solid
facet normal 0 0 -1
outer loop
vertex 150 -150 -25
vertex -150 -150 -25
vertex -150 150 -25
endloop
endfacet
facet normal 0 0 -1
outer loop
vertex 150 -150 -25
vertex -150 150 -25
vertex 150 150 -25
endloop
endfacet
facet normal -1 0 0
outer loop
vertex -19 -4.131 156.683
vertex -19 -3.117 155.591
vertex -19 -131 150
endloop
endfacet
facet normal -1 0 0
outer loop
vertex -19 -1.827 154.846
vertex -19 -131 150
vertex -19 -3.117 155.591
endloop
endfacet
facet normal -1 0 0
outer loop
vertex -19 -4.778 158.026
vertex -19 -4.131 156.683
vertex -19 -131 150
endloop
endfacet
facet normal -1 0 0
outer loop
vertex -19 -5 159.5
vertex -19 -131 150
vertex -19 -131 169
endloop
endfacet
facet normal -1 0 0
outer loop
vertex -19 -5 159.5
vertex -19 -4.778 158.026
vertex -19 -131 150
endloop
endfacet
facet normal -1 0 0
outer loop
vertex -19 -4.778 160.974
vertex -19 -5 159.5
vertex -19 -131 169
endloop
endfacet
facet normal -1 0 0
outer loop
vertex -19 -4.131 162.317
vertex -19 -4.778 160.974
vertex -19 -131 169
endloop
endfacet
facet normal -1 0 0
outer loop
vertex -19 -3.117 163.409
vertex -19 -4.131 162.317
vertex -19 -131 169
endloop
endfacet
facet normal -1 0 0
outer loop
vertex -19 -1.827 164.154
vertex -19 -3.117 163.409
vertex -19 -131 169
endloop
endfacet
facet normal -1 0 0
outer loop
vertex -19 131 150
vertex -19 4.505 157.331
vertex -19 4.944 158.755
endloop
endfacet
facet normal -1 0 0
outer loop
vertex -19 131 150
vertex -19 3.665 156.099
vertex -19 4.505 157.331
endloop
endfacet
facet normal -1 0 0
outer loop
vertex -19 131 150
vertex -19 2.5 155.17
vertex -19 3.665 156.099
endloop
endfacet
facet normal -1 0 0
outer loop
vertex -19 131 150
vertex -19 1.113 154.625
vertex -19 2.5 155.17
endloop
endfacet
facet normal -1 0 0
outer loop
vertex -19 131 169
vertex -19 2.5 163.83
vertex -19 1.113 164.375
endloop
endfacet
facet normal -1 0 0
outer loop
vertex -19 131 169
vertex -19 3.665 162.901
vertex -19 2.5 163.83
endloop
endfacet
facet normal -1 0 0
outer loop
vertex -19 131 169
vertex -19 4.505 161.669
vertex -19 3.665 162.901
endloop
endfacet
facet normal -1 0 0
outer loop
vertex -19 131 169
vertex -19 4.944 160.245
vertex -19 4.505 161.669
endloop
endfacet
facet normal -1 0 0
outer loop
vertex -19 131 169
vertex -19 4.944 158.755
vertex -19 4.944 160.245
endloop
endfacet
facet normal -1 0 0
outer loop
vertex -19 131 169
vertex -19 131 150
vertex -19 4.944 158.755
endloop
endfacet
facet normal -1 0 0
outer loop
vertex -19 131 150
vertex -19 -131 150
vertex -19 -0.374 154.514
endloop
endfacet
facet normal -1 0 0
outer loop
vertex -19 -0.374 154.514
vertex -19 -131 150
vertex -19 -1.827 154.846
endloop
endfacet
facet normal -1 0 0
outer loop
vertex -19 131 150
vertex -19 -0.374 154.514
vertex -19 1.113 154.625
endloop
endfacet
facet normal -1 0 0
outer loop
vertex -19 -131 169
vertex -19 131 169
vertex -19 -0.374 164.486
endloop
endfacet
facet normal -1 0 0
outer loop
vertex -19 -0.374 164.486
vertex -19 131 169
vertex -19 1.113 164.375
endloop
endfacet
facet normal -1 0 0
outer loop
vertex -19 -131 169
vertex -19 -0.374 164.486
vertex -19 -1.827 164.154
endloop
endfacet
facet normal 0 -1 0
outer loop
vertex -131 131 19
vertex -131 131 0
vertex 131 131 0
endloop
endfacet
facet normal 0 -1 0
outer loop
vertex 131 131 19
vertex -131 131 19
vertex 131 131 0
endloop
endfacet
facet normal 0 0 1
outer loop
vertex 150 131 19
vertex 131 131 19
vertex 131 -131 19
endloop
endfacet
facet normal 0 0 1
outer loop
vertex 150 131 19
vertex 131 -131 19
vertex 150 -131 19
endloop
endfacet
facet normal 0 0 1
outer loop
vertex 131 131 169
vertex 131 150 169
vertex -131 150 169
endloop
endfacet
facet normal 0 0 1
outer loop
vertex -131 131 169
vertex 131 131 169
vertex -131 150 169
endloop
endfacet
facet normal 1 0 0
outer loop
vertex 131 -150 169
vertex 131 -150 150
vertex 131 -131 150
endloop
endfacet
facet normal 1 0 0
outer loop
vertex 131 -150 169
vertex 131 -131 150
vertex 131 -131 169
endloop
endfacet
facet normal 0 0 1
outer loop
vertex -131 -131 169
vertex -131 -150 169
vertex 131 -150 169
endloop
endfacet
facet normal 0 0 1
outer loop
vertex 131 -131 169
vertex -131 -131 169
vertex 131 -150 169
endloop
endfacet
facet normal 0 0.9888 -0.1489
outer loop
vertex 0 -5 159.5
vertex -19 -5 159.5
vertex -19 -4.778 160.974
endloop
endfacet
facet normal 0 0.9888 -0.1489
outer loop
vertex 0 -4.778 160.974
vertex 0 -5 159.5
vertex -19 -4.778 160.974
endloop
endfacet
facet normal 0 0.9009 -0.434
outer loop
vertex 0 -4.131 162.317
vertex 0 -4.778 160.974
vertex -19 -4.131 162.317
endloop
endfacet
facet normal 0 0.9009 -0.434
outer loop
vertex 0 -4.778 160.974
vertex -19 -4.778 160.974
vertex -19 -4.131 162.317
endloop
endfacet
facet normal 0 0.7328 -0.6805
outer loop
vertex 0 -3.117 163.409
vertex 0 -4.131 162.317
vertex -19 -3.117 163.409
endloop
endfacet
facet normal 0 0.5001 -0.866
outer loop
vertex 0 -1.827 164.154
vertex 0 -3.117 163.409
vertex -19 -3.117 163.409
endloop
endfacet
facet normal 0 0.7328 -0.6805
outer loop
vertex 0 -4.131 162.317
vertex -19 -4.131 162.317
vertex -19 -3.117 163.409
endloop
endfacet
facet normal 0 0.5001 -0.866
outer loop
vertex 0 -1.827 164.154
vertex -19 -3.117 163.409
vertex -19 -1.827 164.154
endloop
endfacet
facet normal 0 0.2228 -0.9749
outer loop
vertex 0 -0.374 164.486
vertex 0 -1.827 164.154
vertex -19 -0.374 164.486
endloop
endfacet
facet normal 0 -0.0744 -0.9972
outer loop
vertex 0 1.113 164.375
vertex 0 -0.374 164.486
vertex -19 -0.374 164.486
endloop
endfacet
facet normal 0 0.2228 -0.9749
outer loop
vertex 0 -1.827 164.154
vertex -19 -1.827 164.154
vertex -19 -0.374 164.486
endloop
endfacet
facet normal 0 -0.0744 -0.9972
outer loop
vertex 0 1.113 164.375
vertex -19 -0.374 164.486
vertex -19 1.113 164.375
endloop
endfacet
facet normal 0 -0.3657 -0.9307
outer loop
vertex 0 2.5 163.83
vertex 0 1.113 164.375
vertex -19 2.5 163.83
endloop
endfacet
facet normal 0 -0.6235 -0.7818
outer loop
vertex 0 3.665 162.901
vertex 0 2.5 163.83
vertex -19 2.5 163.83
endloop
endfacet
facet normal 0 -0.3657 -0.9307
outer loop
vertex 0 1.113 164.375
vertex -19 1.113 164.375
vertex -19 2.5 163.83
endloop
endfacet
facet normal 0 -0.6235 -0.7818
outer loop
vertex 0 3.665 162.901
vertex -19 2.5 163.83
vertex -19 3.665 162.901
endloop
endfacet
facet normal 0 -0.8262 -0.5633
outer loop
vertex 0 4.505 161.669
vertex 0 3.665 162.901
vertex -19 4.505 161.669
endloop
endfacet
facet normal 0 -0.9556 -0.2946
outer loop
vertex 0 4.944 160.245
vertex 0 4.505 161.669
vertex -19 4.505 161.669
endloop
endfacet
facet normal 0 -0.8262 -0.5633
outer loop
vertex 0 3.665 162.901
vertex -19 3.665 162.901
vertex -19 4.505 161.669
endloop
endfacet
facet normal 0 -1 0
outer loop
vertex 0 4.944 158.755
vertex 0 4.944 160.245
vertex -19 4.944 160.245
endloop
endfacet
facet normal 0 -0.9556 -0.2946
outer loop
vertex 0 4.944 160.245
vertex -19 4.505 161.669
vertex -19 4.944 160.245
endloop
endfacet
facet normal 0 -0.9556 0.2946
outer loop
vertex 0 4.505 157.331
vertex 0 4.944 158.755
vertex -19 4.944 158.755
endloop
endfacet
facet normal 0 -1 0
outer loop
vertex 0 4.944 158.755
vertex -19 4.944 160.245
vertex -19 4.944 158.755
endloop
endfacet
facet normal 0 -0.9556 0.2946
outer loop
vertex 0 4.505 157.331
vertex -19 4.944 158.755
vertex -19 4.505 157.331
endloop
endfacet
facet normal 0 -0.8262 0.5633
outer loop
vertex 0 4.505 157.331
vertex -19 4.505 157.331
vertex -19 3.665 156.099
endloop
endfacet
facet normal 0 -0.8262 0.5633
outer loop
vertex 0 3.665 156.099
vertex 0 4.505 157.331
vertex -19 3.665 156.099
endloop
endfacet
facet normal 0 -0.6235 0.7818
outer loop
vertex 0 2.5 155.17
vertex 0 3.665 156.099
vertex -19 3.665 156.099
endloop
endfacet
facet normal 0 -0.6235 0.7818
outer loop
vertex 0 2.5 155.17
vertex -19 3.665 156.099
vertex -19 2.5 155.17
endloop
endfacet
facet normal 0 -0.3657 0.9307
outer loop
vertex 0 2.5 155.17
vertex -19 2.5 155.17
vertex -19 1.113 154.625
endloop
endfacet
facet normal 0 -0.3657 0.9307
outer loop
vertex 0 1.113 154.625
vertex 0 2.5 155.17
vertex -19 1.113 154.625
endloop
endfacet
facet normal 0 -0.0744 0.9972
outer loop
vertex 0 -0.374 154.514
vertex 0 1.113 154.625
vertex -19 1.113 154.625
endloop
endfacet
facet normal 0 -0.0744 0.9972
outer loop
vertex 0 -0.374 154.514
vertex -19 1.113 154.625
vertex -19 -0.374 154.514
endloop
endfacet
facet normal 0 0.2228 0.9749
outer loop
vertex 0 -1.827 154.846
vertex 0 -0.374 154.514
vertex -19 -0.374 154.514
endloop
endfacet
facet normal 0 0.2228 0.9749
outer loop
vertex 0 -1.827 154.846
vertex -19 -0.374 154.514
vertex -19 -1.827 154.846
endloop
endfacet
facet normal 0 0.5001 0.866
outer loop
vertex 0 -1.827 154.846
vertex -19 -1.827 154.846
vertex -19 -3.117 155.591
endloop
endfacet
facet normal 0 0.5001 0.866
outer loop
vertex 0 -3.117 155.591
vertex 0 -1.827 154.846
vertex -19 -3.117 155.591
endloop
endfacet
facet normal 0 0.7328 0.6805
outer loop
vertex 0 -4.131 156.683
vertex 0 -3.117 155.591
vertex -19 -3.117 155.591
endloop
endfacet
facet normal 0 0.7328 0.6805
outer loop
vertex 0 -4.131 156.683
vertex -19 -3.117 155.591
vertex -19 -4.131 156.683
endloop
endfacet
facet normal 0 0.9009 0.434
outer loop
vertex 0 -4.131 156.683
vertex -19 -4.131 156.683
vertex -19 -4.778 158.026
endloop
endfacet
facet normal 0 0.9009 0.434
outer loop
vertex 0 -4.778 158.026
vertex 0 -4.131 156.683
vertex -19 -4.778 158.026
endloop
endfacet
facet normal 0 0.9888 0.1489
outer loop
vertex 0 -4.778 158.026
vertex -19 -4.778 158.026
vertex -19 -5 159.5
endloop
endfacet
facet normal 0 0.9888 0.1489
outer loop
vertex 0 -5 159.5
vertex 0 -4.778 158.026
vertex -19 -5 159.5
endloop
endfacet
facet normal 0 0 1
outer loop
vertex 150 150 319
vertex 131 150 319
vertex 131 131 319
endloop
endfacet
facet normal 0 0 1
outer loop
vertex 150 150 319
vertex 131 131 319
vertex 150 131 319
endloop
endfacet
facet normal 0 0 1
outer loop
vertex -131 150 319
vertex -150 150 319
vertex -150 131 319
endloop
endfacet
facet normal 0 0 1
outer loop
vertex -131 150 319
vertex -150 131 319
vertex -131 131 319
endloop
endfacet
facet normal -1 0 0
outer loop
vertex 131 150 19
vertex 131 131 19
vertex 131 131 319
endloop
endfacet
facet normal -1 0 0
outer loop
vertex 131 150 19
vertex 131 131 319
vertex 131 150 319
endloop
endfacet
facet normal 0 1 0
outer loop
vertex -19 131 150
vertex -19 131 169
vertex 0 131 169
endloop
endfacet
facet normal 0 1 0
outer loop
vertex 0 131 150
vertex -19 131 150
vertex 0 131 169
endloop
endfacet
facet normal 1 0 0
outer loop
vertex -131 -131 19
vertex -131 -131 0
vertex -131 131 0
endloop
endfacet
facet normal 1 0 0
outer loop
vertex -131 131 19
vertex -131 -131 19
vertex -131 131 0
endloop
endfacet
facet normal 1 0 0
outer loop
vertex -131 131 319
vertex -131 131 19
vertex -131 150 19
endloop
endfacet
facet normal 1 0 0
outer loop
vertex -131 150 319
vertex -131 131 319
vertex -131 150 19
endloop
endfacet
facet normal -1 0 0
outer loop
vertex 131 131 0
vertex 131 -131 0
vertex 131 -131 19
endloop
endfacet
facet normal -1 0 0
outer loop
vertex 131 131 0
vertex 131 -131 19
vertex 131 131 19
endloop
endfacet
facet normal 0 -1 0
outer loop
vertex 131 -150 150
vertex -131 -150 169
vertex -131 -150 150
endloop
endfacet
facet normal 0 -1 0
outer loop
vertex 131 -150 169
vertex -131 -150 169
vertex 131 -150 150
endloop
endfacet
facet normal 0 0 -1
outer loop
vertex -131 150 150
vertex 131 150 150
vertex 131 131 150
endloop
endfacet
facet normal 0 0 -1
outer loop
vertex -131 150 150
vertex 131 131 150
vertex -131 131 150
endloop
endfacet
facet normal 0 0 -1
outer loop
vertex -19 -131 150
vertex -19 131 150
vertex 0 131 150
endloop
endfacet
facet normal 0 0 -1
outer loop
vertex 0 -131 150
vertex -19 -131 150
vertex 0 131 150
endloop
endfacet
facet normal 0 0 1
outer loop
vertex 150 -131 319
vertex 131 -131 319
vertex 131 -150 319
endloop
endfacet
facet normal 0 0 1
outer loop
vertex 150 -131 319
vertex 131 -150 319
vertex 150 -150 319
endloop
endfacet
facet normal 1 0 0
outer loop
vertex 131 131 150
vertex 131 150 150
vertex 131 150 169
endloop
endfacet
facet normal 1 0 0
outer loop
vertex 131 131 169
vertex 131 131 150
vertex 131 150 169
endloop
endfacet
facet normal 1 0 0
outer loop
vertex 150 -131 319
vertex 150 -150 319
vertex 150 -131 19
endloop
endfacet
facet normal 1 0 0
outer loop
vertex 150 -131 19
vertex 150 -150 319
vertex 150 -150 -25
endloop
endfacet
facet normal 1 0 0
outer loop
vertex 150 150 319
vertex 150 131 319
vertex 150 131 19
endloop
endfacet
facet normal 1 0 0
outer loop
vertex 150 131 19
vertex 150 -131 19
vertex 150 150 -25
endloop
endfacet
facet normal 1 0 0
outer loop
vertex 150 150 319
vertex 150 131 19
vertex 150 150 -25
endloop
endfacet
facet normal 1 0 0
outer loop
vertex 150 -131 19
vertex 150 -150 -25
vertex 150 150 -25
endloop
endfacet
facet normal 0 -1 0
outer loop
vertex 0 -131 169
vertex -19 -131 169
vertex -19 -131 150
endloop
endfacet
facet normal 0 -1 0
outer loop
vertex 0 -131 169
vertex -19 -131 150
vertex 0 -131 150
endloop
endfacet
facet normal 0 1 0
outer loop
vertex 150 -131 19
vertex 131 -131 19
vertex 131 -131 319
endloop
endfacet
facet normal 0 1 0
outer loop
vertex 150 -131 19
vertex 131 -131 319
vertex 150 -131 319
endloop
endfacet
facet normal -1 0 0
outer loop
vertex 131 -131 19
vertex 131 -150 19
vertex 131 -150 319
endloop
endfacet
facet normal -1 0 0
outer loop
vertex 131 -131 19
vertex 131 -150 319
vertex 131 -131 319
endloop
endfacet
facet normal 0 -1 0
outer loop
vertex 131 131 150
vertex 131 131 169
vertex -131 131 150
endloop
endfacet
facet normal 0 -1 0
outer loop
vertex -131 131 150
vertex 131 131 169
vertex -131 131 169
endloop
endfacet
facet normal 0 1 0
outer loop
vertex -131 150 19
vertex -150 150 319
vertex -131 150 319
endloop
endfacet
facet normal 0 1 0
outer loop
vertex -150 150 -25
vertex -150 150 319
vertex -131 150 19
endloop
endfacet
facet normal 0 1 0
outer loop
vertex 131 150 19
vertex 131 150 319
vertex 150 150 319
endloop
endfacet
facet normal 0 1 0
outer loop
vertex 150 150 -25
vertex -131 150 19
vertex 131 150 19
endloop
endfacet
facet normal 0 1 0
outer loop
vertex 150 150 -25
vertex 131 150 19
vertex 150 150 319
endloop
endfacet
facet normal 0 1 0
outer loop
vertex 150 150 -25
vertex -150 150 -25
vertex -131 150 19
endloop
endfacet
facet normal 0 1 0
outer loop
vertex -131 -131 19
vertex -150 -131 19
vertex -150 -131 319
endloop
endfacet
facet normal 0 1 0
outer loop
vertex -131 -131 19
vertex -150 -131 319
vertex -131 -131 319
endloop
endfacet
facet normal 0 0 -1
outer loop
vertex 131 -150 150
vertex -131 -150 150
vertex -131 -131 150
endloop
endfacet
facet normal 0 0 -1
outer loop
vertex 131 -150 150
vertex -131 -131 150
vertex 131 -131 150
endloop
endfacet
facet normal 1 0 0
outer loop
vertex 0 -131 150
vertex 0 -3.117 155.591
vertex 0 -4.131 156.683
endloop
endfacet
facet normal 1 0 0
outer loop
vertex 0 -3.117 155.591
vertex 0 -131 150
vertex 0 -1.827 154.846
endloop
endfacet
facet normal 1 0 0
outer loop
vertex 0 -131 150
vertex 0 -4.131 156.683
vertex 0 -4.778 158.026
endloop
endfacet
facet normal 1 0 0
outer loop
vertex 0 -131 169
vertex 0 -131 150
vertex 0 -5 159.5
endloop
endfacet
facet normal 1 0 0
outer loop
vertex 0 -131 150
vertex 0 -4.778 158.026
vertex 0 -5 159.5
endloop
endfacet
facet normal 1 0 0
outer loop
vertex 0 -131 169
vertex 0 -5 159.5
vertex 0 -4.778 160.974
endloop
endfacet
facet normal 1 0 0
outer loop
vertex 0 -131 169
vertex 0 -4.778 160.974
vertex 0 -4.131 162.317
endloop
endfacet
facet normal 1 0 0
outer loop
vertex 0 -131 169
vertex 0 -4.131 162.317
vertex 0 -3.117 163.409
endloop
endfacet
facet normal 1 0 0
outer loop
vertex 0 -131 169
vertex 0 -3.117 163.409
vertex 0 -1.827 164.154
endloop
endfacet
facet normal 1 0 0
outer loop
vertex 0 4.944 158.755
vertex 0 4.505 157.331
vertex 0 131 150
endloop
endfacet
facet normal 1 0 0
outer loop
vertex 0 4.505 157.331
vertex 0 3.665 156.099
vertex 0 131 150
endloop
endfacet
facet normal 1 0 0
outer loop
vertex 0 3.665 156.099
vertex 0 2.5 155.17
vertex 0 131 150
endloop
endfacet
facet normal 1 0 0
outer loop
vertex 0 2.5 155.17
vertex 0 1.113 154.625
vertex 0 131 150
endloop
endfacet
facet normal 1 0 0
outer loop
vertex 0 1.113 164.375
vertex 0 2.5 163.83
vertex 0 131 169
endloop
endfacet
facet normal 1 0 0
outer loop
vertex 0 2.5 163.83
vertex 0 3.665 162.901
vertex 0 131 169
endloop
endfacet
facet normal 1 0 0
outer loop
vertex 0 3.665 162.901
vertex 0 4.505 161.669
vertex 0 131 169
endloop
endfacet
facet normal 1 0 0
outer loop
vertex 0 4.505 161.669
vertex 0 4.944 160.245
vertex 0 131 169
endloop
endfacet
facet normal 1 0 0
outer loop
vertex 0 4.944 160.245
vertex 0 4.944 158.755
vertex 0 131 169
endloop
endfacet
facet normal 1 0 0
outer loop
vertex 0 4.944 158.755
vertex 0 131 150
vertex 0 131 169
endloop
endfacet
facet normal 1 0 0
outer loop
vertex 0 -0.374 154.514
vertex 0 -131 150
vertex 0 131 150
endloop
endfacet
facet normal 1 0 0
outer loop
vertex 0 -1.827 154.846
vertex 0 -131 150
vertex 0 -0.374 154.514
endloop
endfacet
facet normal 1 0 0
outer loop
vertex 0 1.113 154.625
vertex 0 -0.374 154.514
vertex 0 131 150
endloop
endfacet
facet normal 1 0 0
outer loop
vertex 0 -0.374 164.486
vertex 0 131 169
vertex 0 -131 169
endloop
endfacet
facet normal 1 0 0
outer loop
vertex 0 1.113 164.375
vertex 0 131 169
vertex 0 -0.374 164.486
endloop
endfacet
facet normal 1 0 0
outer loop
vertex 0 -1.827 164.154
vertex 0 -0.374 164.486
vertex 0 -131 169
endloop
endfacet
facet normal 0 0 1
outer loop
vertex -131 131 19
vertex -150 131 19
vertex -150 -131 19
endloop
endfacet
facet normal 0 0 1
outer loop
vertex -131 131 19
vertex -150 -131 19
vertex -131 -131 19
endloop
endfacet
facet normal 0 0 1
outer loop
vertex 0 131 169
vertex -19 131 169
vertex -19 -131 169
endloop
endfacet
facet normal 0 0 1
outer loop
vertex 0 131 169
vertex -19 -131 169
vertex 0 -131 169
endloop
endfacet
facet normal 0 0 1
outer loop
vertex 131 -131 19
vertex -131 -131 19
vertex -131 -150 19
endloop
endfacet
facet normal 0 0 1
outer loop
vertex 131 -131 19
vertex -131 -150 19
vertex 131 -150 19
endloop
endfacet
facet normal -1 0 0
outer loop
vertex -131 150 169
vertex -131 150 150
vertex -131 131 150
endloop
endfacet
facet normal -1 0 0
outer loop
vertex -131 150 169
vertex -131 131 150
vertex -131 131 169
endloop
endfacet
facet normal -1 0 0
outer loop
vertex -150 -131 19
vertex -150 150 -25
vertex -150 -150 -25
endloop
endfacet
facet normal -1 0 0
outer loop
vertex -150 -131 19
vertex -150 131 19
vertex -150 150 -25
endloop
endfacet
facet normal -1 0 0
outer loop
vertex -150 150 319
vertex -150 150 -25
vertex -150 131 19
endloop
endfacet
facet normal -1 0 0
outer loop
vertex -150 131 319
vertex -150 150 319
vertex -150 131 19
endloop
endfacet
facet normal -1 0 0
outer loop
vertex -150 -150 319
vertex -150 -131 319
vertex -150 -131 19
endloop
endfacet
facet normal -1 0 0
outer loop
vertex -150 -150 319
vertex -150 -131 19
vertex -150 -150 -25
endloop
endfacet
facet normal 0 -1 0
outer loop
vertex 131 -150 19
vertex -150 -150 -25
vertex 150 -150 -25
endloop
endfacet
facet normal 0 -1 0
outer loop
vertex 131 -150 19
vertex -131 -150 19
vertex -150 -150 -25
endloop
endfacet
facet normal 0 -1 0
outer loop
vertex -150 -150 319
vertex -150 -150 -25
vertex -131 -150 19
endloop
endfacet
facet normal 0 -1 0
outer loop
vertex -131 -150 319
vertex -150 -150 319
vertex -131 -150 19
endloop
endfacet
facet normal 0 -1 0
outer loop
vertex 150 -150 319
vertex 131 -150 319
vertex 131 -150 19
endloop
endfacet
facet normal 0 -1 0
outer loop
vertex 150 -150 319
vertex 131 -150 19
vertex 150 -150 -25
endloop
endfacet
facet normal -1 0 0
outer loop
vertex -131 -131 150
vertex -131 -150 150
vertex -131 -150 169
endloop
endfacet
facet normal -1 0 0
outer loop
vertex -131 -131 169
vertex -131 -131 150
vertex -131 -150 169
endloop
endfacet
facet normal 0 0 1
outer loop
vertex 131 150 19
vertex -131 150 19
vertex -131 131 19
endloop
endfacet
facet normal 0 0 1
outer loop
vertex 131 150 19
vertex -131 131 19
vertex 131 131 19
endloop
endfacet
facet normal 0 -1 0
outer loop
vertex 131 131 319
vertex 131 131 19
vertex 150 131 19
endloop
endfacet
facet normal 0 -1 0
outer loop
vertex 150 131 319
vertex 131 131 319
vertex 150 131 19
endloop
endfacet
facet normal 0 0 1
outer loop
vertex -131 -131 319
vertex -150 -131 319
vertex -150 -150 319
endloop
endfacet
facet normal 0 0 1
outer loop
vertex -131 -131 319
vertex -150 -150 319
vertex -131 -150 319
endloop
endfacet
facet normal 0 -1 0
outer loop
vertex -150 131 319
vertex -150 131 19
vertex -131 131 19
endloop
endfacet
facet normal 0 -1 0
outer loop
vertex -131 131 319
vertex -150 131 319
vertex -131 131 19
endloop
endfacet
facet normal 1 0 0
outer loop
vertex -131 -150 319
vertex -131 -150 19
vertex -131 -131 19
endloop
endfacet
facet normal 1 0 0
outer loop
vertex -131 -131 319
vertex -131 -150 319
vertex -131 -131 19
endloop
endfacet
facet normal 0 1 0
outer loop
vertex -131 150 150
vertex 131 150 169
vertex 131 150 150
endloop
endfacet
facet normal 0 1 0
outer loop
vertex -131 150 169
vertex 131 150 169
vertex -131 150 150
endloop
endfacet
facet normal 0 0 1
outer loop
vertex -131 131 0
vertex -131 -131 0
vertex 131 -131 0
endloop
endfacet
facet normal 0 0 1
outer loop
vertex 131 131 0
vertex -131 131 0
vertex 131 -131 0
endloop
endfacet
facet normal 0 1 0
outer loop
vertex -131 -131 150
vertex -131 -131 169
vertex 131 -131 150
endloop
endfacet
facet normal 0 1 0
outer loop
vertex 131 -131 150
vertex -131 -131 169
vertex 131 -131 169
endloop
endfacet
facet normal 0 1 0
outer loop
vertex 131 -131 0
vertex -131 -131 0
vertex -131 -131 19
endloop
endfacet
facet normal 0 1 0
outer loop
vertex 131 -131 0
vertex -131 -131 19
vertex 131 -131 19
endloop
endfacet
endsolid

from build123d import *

# Parameters (mm, degrees)
F0_W      = 300
F0_H      = 300
F0_W_2    = 262
F0_H_2    = 262
F1_DEPTH  = 19
F2_W      = 300
F2_H      = 300
F2_W_2    = 262
F2_H_2    = 262
F3_DEPTH  = 25
F4_W      = 19
F4_H      = 19
F5_DEPTH  = 300
F6_W      = 262
F6_H      = 19
F7_DEPTH  = 19
F8_W      = 262
F8_H      = 19
F9_DEPTH  = 19
F10_W     = 19
F10_H     = 19
F11_DEPTH = 262
F12_R     = 5
F13_DEPTH = 25


with BuildPart() as f1:
    # F0 (on Top) → F1 (new body)
    with BuildSketch(Plane.XY):
        Rectangle(F0_W, F0_H)
        Rectangle(F0_W_2, F0_H_2, mode=Mode.SUBTRACT)
    extrude(amount=F1_DEPTH)

    # F2 (on face) → F3 (join)
    with BuildSketch(Plane(origin=(0, 0, 0), x_dir=(1, 0, 0), z_dir=(0, 0, -1))):
        Rectangle(F2_W, F2_H)
        Rectangle(F2_W_2, F2_H_2, mode=Mode.SUBTRACT)
        Rectangle(F2_W_2, F2_H_2)
    extrude(amount=F3_DEPTH)

    # F4 (on face) → F5 (join)
    with BuildSketch(Plane.XY.offset(19)):
        with Locations((140.5, 140.5)):
            Rectangle(F4_W, F4_H)
        with Locations((-140.5, 140.5)):
            Rectangle(F4_W, F4_H)
        with Locations((140.5, -140.5)):
            Rectangle(F4_W, F4_H)
        with Locations((-140.5, -140.5)):
            Rectangle(F4_W, F4_H)
    extrude(amount=F5_DEPTH)


with BuildPart() as f7:
    # F6 (on face) → F7 (new body)
    with BuildSketch(Plane.XZ.offset(150)):
        with Locations((0, 159.5)):
            Rectangle(F6_W, F6_H)
    extrude(amount=-F7_DEPTH)


with BuildPart() as f9:
    # F8 (on face) → F9 (new body)
    with BuildSketch(Plane(origin=(0, 150, 0), x_dir=(-1, 0, 0), z_dir=(0, 1, 0))):
        with Locations((0, 159.5)):
            Rectangle(F8_W, F8_H)
    extrude(amount=-F9_DEPTH)


with BuildPart() as f11:
    # F10 (on face) → F11 (new body)
    with BuildSketch(Plane.XZ.offset(-131)):
        with Locations((-9.5, 159.5)):
            Rectangle(F10_W, F10_H)
    extrude(amount=F11_DEPTH)

    # F12 (on face) → F13 (cut)
    with BuildSketch(Plane(origin=(-19, 0, 0), x_dir=(0, -1, 0), z_dir=(-1, 0, 0))):
        with Locations((0, 159.5)):
            Circle(F12_R)
    extrude(amount=-F13_DEPTH, mode=Mode.SUBTRACT)


solid = Compound([f1.part, f7.part, f9.part, f11.part])
